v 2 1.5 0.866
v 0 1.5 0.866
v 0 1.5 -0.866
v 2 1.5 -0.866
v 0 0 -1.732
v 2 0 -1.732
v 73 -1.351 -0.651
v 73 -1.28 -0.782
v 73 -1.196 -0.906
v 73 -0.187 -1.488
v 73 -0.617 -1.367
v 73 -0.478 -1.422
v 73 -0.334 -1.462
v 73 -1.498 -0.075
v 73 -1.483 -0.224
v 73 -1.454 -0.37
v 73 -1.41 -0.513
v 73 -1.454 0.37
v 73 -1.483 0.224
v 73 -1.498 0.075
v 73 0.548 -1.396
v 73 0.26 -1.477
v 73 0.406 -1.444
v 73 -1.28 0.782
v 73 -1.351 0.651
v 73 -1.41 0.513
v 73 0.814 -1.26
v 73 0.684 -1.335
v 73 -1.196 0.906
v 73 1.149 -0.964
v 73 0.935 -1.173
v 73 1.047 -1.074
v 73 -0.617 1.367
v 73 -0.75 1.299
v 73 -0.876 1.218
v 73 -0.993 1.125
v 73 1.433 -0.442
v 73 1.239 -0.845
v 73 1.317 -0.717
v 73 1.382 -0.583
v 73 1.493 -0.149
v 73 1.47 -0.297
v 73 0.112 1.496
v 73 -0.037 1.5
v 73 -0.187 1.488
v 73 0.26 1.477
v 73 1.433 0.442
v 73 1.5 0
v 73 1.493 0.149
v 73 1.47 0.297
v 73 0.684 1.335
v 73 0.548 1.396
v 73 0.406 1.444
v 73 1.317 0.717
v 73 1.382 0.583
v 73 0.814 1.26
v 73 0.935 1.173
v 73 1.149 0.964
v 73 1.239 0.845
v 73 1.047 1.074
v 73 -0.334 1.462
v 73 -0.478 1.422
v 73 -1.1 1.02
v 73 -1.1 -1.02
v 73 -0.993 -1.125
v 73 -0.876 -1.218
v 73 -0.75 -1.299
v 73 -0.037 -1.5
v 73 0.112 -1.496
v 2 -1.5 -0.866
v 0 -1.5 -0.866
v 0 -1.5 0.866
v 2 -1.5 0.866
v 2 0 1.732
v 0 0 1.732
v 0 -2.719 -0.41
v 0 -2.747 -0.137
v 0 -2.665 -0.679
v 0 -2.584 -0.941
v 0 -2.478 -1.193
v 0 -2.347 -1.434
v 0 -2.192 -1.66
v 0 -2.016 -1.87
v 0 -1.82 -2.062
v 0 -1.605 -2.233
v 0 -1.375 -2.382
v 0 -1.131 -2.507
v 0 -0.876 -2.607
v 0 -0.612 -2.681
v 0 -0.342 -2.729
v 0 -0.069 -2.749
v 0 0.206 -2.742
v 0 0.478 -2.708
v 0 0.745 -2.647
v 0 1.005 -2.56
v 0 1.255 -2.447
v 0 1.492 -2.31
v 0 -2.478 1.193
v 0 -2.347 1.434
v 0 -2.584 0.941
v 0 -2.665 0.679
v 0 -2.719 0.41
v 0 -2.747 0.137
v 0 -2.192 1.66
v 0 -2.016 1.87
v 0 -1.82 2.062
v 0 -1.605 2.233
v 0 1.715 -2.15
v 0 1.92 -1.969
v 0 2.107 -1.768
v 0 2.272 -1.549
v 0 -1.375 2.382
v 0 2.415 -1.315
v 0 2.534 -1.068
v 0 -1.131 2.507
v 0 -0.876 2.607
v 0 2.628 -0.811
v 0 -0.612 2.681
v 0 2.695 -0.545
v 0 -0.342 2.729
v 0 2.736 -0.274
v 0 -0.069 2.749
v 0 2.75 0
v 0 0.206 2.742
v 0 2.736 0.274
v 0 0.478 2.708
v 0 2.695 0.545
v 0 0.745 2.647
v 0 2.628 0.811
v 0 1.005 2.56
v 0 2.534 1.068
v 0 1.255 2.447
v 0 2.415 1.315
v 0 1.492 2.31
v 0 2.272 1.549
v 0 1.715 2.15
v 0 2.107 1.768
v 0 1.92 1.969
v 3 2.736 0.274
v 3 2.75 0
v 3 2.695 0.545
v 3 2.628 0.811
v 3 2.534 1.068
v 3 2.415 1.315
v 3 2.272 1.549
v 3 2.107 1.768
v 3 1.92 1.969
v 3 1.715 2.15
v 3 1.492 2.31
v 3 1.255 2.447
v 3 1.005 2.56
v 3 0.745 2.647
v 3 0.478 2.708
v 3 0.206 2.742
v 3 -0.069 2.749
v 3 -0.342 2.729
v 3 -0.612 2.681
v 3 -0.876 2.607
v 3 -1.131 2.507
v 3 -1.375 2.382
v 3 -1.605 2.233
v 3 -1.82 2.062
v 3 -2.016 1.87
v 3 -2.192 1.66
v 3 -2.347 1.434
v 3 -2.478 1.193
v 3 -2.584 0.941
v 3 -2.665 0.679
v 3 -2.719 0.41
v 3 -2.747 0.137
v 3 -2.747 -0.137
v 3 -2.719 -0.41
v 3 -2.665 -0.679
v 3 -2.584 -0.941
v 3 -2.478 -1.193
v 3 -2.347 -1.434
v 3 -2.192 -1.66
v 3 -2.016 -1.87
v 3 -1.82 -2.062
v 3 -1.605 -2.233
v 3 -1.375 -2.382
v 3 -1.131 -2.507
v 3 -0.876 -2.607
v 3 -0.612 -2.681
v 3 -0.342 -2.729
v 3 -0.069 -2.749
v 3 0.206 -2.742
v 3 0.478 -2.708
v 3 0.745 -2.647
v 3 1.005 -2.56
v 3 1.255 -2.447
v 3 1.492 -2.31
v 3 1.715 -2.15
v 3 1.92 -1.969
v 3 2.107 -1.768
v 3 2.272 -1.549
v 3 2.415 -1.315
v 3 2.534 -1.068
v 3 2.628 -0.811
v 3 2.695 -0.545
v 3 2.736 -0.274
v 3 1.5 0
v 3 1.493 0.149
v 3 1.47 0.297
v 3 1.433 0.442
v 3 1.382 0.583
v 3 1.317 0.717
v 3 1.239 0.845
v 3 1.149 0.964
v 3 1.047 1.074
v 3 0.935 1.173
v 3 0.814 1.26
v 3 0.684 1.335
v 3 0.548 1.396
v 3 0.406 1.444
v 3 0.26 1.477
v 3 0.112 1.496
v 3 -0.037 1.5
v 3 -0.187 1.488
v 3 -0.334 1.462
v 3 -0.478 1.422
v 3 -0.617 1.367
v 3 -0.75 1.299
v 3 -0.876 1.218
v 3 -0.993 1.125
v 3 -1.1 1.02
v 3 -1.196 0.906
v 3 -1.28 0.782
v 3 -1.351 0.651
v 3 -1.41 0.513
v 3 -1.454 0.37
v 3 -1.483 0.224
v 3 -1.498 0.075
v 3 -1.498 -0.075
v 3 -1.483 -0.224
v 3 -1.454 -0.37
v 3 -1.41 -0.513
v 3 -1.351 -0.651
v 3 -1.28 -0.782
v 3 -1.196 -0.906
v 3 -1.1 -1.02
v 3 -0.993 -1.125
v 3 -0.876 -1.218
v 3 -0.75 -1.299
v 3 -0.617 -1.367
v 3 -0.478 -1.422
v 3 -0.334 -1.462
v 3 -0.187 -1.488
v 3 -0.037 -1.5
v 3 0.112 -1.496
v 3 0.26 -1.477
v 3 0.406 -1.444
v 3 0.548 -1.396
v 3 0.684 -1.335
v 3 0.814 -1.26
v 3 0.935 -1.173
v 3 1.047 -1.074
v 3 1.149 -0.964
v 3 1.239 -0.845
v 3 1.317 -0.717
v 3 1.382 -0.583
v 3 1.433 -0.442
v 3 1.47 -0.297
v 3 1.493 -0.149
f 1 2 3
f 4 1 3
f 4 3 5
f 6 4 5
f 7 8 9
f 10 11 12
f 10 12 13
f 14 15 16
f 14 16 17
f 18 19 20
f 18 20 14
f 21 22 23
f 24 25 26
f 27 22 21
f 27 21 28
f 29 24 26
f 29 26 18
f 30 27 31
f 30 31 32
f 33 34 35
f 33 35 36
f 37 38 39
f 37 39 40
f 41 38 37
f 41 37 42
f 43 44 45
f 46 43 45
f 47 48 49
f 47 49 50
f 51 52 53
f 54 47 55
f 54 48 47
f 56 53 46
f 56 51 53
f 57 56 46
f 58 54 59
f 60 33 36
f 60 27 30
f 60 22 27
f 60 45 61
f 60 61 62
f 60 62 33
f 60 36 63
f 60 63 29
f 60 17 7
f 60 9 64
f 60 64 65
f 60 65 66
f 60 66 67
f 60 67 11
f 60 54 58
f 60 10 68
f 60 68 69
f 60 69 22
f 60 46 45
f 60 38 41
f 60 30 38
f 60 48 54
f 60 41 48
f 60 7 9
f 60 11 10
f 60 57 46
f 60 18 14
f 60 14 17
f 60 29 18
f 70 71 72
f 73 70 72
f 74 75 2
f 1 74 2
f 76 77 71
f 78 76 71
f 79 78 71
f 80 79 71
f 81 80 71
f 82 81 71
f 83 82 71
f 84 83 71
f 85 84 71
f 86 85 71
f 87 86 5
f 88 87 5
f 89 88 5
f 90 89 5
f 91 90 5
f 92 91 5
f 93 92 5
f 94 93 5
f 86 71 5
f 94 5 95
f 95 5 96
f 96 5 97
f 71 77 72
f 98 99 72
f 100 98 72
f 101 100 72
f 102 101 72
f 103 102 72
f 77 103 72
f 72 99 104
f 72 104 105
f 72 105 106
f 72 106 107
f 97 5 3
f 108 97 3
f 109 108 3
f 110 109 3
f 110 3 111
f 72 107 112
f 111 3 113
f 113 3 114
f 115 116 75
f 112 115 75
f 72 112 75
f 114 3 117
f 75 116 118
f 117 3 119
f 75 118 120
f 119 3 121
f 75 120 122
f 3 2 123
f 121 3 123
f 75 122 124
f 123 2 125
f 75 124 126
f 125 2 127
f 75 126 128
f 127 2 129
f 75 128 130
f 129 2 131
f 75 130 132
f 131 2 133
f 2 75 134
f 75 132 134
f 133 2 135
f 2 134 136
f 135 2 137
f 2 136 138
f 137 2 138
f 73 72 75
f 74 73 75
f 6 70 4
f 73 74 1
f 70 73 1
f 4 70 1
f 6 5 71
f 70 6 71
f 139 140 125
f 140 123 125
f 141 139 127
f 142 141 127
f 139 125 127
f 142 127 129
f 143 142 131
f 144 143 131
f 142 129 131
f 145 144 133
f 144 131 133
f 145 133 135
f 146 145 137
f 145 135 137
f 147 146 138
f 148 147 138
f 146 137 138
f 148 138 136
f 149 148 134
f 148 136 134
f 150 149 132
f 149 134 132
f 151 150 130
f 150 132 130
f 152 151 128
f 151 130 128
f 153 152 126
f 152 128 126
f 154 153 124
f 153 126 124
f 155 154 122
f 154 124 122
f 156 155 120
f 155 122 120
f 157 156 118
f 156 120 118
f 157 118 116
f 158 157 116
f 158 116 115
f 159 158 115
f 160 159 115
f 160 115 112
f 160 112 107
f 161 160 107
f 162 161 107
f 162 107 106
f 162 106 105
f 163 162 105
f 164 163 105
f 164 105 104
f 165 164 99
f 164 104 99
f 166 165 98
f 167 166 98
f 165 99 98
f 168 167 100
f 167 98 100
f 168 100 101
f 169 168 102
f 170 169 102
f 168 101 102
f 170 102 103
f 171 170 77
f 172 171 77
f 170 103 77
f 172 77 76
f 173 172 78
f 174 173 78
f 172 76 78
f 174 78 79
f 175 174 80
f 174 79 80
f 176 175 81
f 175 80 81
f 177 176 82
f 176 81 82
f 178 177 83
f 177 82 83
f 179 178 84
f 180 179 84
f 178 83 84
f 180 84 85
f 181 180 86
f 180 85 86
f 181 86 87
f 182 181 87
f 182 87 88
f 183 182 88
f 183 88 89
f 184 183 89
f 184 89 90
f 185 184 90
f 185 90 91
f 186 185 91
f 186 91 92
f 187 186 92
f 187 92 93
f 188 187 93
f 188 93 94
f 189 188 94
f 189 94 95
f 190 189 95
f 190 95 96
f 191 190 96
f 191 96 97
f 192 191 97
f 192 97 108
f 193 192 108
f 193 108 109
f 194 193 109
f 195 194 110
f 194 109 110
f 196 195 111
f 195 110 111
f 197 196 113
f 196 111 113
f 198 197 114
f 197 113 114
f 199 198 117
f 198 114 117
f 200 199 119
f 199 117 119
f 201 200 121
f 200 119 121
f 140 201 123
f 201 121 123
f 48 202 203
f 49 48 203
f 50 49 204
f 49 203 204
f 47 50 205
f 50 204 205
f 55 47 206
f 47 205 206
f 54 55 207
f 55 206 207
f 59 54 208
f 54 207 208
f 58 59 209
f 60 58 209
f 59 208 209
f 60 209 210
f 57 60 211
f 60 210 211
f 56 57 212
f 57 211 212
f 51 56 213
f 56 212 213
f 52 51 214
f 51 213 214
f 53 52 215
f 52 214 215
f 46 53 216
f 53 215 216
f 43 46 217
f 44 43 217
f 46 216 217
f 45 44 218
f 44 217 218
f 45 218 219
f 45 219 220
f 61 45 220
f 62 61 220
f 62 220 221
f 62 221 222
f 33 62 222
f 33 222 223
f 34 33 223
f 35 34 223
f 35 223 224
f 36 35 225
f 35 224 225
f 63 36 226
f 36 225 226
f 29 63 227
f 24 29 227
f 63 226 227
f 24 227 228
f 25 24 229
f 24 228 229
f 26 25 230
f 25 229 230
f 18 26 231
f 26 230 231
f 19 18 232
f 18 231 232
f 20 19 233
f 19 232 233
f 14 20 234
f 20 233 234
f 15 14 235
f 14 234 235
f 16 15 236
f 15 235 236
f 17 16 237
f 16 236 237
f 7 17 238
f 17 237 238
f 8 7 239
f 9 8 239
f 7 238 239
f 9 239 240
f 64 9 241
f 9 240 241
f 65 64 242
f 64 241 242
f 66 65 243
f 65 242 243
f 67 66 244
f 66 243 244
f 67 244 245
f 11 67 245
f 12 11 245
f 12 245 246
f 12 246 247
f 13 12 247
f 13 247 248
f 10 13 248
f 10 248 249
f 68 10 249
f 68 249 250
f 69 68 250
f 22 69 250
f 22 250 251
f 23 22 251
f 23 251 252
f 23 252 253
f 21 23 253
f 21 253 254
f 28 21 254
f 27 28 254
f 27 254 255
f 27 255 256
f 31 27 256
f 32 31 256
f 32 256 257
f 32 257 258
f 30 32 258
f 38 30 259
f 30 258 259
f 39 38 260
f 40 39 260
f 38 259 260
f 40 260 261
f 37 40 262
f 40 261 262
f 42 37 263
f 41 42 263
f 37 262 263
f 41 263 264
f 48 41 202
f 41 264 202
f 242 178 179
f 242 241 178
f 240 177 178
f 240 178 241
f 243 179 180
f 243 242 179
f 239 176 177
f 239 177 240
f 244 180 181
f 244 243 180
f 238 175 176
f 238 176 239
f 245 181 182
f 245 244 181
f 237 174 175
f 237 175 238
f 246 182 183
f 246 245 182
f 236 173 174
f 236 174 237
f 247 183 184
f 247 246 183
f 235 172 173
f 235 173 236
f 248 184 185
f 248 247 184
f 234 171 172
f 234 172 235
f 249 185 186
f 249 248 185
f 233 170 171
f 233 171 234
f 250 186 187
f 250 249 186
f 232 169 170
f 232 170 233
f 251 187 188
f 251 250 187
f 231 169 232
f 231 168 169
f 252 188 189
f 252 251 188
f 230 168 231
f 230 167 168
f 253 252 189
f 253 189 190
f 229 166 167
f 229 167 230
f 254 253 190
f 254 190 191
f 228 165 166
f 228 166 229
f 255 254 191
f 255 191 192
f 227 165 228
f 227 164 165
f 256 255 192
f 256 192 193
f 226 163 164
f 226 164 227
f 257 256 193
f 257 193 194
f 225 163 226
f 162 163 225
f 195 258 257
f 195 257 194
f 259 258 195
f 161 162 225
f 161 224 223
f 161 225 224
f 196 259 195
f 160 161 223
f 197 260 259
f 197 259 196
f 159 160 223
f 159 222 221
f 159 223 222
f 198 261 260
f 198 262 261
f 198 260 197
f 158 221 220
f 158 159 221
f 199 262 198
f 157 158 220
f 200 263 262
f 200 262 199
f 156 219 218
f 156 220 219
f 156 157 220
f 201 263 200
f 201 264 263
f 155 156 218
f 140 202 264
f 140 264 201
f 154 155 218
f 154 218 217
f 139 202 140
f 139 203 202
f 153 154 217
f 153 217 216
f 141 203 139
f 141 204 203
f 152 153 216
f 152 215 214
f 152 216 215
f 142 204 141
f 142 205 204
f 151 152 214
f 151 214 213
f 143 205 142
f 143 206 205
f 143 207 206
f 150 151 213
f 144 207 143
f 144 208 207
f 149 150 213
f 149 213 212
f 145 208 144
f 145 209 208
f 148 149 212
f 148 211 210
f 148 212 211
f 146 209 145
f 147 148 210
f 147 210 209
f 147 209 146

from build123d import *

# Parameters (mm, degrees)
F0_R     = 2.75
F1_DEPTH = 2
F2_R     = 2.75
F3_DEPTH = 1
F4_R     = 1.5
F5_DEPTH = 70


with BuildPart() as f1:
    # F0 (on Right) → F1 (new body)
    with BuildSketch(Plane.YZ):
        Circle(F0_R)
        Polygon((-1.5, -0.866025), (-1.5, 0.866025), (0, 1.732051), (1.5, 0.866025), (1.5, -0.866025), (0, -1.732051), align=None, mode=Mode.SUBTRACT)
    extrude(amount=F1_DEPTH)

    # F2 (on face) → F3 (join)
    with BuildSketch(Plane.YZ.offset(2)):
        Circle(F2_R)
    extrude(amount=F3_DEPTH)

    # F4 (on face) → F5 (join)
    with BuildSketch(Plane.YZ.offset(3)):
        Circle(F4_R)
    extrude(amount=F5_DEPTH)


solid = f1.part
